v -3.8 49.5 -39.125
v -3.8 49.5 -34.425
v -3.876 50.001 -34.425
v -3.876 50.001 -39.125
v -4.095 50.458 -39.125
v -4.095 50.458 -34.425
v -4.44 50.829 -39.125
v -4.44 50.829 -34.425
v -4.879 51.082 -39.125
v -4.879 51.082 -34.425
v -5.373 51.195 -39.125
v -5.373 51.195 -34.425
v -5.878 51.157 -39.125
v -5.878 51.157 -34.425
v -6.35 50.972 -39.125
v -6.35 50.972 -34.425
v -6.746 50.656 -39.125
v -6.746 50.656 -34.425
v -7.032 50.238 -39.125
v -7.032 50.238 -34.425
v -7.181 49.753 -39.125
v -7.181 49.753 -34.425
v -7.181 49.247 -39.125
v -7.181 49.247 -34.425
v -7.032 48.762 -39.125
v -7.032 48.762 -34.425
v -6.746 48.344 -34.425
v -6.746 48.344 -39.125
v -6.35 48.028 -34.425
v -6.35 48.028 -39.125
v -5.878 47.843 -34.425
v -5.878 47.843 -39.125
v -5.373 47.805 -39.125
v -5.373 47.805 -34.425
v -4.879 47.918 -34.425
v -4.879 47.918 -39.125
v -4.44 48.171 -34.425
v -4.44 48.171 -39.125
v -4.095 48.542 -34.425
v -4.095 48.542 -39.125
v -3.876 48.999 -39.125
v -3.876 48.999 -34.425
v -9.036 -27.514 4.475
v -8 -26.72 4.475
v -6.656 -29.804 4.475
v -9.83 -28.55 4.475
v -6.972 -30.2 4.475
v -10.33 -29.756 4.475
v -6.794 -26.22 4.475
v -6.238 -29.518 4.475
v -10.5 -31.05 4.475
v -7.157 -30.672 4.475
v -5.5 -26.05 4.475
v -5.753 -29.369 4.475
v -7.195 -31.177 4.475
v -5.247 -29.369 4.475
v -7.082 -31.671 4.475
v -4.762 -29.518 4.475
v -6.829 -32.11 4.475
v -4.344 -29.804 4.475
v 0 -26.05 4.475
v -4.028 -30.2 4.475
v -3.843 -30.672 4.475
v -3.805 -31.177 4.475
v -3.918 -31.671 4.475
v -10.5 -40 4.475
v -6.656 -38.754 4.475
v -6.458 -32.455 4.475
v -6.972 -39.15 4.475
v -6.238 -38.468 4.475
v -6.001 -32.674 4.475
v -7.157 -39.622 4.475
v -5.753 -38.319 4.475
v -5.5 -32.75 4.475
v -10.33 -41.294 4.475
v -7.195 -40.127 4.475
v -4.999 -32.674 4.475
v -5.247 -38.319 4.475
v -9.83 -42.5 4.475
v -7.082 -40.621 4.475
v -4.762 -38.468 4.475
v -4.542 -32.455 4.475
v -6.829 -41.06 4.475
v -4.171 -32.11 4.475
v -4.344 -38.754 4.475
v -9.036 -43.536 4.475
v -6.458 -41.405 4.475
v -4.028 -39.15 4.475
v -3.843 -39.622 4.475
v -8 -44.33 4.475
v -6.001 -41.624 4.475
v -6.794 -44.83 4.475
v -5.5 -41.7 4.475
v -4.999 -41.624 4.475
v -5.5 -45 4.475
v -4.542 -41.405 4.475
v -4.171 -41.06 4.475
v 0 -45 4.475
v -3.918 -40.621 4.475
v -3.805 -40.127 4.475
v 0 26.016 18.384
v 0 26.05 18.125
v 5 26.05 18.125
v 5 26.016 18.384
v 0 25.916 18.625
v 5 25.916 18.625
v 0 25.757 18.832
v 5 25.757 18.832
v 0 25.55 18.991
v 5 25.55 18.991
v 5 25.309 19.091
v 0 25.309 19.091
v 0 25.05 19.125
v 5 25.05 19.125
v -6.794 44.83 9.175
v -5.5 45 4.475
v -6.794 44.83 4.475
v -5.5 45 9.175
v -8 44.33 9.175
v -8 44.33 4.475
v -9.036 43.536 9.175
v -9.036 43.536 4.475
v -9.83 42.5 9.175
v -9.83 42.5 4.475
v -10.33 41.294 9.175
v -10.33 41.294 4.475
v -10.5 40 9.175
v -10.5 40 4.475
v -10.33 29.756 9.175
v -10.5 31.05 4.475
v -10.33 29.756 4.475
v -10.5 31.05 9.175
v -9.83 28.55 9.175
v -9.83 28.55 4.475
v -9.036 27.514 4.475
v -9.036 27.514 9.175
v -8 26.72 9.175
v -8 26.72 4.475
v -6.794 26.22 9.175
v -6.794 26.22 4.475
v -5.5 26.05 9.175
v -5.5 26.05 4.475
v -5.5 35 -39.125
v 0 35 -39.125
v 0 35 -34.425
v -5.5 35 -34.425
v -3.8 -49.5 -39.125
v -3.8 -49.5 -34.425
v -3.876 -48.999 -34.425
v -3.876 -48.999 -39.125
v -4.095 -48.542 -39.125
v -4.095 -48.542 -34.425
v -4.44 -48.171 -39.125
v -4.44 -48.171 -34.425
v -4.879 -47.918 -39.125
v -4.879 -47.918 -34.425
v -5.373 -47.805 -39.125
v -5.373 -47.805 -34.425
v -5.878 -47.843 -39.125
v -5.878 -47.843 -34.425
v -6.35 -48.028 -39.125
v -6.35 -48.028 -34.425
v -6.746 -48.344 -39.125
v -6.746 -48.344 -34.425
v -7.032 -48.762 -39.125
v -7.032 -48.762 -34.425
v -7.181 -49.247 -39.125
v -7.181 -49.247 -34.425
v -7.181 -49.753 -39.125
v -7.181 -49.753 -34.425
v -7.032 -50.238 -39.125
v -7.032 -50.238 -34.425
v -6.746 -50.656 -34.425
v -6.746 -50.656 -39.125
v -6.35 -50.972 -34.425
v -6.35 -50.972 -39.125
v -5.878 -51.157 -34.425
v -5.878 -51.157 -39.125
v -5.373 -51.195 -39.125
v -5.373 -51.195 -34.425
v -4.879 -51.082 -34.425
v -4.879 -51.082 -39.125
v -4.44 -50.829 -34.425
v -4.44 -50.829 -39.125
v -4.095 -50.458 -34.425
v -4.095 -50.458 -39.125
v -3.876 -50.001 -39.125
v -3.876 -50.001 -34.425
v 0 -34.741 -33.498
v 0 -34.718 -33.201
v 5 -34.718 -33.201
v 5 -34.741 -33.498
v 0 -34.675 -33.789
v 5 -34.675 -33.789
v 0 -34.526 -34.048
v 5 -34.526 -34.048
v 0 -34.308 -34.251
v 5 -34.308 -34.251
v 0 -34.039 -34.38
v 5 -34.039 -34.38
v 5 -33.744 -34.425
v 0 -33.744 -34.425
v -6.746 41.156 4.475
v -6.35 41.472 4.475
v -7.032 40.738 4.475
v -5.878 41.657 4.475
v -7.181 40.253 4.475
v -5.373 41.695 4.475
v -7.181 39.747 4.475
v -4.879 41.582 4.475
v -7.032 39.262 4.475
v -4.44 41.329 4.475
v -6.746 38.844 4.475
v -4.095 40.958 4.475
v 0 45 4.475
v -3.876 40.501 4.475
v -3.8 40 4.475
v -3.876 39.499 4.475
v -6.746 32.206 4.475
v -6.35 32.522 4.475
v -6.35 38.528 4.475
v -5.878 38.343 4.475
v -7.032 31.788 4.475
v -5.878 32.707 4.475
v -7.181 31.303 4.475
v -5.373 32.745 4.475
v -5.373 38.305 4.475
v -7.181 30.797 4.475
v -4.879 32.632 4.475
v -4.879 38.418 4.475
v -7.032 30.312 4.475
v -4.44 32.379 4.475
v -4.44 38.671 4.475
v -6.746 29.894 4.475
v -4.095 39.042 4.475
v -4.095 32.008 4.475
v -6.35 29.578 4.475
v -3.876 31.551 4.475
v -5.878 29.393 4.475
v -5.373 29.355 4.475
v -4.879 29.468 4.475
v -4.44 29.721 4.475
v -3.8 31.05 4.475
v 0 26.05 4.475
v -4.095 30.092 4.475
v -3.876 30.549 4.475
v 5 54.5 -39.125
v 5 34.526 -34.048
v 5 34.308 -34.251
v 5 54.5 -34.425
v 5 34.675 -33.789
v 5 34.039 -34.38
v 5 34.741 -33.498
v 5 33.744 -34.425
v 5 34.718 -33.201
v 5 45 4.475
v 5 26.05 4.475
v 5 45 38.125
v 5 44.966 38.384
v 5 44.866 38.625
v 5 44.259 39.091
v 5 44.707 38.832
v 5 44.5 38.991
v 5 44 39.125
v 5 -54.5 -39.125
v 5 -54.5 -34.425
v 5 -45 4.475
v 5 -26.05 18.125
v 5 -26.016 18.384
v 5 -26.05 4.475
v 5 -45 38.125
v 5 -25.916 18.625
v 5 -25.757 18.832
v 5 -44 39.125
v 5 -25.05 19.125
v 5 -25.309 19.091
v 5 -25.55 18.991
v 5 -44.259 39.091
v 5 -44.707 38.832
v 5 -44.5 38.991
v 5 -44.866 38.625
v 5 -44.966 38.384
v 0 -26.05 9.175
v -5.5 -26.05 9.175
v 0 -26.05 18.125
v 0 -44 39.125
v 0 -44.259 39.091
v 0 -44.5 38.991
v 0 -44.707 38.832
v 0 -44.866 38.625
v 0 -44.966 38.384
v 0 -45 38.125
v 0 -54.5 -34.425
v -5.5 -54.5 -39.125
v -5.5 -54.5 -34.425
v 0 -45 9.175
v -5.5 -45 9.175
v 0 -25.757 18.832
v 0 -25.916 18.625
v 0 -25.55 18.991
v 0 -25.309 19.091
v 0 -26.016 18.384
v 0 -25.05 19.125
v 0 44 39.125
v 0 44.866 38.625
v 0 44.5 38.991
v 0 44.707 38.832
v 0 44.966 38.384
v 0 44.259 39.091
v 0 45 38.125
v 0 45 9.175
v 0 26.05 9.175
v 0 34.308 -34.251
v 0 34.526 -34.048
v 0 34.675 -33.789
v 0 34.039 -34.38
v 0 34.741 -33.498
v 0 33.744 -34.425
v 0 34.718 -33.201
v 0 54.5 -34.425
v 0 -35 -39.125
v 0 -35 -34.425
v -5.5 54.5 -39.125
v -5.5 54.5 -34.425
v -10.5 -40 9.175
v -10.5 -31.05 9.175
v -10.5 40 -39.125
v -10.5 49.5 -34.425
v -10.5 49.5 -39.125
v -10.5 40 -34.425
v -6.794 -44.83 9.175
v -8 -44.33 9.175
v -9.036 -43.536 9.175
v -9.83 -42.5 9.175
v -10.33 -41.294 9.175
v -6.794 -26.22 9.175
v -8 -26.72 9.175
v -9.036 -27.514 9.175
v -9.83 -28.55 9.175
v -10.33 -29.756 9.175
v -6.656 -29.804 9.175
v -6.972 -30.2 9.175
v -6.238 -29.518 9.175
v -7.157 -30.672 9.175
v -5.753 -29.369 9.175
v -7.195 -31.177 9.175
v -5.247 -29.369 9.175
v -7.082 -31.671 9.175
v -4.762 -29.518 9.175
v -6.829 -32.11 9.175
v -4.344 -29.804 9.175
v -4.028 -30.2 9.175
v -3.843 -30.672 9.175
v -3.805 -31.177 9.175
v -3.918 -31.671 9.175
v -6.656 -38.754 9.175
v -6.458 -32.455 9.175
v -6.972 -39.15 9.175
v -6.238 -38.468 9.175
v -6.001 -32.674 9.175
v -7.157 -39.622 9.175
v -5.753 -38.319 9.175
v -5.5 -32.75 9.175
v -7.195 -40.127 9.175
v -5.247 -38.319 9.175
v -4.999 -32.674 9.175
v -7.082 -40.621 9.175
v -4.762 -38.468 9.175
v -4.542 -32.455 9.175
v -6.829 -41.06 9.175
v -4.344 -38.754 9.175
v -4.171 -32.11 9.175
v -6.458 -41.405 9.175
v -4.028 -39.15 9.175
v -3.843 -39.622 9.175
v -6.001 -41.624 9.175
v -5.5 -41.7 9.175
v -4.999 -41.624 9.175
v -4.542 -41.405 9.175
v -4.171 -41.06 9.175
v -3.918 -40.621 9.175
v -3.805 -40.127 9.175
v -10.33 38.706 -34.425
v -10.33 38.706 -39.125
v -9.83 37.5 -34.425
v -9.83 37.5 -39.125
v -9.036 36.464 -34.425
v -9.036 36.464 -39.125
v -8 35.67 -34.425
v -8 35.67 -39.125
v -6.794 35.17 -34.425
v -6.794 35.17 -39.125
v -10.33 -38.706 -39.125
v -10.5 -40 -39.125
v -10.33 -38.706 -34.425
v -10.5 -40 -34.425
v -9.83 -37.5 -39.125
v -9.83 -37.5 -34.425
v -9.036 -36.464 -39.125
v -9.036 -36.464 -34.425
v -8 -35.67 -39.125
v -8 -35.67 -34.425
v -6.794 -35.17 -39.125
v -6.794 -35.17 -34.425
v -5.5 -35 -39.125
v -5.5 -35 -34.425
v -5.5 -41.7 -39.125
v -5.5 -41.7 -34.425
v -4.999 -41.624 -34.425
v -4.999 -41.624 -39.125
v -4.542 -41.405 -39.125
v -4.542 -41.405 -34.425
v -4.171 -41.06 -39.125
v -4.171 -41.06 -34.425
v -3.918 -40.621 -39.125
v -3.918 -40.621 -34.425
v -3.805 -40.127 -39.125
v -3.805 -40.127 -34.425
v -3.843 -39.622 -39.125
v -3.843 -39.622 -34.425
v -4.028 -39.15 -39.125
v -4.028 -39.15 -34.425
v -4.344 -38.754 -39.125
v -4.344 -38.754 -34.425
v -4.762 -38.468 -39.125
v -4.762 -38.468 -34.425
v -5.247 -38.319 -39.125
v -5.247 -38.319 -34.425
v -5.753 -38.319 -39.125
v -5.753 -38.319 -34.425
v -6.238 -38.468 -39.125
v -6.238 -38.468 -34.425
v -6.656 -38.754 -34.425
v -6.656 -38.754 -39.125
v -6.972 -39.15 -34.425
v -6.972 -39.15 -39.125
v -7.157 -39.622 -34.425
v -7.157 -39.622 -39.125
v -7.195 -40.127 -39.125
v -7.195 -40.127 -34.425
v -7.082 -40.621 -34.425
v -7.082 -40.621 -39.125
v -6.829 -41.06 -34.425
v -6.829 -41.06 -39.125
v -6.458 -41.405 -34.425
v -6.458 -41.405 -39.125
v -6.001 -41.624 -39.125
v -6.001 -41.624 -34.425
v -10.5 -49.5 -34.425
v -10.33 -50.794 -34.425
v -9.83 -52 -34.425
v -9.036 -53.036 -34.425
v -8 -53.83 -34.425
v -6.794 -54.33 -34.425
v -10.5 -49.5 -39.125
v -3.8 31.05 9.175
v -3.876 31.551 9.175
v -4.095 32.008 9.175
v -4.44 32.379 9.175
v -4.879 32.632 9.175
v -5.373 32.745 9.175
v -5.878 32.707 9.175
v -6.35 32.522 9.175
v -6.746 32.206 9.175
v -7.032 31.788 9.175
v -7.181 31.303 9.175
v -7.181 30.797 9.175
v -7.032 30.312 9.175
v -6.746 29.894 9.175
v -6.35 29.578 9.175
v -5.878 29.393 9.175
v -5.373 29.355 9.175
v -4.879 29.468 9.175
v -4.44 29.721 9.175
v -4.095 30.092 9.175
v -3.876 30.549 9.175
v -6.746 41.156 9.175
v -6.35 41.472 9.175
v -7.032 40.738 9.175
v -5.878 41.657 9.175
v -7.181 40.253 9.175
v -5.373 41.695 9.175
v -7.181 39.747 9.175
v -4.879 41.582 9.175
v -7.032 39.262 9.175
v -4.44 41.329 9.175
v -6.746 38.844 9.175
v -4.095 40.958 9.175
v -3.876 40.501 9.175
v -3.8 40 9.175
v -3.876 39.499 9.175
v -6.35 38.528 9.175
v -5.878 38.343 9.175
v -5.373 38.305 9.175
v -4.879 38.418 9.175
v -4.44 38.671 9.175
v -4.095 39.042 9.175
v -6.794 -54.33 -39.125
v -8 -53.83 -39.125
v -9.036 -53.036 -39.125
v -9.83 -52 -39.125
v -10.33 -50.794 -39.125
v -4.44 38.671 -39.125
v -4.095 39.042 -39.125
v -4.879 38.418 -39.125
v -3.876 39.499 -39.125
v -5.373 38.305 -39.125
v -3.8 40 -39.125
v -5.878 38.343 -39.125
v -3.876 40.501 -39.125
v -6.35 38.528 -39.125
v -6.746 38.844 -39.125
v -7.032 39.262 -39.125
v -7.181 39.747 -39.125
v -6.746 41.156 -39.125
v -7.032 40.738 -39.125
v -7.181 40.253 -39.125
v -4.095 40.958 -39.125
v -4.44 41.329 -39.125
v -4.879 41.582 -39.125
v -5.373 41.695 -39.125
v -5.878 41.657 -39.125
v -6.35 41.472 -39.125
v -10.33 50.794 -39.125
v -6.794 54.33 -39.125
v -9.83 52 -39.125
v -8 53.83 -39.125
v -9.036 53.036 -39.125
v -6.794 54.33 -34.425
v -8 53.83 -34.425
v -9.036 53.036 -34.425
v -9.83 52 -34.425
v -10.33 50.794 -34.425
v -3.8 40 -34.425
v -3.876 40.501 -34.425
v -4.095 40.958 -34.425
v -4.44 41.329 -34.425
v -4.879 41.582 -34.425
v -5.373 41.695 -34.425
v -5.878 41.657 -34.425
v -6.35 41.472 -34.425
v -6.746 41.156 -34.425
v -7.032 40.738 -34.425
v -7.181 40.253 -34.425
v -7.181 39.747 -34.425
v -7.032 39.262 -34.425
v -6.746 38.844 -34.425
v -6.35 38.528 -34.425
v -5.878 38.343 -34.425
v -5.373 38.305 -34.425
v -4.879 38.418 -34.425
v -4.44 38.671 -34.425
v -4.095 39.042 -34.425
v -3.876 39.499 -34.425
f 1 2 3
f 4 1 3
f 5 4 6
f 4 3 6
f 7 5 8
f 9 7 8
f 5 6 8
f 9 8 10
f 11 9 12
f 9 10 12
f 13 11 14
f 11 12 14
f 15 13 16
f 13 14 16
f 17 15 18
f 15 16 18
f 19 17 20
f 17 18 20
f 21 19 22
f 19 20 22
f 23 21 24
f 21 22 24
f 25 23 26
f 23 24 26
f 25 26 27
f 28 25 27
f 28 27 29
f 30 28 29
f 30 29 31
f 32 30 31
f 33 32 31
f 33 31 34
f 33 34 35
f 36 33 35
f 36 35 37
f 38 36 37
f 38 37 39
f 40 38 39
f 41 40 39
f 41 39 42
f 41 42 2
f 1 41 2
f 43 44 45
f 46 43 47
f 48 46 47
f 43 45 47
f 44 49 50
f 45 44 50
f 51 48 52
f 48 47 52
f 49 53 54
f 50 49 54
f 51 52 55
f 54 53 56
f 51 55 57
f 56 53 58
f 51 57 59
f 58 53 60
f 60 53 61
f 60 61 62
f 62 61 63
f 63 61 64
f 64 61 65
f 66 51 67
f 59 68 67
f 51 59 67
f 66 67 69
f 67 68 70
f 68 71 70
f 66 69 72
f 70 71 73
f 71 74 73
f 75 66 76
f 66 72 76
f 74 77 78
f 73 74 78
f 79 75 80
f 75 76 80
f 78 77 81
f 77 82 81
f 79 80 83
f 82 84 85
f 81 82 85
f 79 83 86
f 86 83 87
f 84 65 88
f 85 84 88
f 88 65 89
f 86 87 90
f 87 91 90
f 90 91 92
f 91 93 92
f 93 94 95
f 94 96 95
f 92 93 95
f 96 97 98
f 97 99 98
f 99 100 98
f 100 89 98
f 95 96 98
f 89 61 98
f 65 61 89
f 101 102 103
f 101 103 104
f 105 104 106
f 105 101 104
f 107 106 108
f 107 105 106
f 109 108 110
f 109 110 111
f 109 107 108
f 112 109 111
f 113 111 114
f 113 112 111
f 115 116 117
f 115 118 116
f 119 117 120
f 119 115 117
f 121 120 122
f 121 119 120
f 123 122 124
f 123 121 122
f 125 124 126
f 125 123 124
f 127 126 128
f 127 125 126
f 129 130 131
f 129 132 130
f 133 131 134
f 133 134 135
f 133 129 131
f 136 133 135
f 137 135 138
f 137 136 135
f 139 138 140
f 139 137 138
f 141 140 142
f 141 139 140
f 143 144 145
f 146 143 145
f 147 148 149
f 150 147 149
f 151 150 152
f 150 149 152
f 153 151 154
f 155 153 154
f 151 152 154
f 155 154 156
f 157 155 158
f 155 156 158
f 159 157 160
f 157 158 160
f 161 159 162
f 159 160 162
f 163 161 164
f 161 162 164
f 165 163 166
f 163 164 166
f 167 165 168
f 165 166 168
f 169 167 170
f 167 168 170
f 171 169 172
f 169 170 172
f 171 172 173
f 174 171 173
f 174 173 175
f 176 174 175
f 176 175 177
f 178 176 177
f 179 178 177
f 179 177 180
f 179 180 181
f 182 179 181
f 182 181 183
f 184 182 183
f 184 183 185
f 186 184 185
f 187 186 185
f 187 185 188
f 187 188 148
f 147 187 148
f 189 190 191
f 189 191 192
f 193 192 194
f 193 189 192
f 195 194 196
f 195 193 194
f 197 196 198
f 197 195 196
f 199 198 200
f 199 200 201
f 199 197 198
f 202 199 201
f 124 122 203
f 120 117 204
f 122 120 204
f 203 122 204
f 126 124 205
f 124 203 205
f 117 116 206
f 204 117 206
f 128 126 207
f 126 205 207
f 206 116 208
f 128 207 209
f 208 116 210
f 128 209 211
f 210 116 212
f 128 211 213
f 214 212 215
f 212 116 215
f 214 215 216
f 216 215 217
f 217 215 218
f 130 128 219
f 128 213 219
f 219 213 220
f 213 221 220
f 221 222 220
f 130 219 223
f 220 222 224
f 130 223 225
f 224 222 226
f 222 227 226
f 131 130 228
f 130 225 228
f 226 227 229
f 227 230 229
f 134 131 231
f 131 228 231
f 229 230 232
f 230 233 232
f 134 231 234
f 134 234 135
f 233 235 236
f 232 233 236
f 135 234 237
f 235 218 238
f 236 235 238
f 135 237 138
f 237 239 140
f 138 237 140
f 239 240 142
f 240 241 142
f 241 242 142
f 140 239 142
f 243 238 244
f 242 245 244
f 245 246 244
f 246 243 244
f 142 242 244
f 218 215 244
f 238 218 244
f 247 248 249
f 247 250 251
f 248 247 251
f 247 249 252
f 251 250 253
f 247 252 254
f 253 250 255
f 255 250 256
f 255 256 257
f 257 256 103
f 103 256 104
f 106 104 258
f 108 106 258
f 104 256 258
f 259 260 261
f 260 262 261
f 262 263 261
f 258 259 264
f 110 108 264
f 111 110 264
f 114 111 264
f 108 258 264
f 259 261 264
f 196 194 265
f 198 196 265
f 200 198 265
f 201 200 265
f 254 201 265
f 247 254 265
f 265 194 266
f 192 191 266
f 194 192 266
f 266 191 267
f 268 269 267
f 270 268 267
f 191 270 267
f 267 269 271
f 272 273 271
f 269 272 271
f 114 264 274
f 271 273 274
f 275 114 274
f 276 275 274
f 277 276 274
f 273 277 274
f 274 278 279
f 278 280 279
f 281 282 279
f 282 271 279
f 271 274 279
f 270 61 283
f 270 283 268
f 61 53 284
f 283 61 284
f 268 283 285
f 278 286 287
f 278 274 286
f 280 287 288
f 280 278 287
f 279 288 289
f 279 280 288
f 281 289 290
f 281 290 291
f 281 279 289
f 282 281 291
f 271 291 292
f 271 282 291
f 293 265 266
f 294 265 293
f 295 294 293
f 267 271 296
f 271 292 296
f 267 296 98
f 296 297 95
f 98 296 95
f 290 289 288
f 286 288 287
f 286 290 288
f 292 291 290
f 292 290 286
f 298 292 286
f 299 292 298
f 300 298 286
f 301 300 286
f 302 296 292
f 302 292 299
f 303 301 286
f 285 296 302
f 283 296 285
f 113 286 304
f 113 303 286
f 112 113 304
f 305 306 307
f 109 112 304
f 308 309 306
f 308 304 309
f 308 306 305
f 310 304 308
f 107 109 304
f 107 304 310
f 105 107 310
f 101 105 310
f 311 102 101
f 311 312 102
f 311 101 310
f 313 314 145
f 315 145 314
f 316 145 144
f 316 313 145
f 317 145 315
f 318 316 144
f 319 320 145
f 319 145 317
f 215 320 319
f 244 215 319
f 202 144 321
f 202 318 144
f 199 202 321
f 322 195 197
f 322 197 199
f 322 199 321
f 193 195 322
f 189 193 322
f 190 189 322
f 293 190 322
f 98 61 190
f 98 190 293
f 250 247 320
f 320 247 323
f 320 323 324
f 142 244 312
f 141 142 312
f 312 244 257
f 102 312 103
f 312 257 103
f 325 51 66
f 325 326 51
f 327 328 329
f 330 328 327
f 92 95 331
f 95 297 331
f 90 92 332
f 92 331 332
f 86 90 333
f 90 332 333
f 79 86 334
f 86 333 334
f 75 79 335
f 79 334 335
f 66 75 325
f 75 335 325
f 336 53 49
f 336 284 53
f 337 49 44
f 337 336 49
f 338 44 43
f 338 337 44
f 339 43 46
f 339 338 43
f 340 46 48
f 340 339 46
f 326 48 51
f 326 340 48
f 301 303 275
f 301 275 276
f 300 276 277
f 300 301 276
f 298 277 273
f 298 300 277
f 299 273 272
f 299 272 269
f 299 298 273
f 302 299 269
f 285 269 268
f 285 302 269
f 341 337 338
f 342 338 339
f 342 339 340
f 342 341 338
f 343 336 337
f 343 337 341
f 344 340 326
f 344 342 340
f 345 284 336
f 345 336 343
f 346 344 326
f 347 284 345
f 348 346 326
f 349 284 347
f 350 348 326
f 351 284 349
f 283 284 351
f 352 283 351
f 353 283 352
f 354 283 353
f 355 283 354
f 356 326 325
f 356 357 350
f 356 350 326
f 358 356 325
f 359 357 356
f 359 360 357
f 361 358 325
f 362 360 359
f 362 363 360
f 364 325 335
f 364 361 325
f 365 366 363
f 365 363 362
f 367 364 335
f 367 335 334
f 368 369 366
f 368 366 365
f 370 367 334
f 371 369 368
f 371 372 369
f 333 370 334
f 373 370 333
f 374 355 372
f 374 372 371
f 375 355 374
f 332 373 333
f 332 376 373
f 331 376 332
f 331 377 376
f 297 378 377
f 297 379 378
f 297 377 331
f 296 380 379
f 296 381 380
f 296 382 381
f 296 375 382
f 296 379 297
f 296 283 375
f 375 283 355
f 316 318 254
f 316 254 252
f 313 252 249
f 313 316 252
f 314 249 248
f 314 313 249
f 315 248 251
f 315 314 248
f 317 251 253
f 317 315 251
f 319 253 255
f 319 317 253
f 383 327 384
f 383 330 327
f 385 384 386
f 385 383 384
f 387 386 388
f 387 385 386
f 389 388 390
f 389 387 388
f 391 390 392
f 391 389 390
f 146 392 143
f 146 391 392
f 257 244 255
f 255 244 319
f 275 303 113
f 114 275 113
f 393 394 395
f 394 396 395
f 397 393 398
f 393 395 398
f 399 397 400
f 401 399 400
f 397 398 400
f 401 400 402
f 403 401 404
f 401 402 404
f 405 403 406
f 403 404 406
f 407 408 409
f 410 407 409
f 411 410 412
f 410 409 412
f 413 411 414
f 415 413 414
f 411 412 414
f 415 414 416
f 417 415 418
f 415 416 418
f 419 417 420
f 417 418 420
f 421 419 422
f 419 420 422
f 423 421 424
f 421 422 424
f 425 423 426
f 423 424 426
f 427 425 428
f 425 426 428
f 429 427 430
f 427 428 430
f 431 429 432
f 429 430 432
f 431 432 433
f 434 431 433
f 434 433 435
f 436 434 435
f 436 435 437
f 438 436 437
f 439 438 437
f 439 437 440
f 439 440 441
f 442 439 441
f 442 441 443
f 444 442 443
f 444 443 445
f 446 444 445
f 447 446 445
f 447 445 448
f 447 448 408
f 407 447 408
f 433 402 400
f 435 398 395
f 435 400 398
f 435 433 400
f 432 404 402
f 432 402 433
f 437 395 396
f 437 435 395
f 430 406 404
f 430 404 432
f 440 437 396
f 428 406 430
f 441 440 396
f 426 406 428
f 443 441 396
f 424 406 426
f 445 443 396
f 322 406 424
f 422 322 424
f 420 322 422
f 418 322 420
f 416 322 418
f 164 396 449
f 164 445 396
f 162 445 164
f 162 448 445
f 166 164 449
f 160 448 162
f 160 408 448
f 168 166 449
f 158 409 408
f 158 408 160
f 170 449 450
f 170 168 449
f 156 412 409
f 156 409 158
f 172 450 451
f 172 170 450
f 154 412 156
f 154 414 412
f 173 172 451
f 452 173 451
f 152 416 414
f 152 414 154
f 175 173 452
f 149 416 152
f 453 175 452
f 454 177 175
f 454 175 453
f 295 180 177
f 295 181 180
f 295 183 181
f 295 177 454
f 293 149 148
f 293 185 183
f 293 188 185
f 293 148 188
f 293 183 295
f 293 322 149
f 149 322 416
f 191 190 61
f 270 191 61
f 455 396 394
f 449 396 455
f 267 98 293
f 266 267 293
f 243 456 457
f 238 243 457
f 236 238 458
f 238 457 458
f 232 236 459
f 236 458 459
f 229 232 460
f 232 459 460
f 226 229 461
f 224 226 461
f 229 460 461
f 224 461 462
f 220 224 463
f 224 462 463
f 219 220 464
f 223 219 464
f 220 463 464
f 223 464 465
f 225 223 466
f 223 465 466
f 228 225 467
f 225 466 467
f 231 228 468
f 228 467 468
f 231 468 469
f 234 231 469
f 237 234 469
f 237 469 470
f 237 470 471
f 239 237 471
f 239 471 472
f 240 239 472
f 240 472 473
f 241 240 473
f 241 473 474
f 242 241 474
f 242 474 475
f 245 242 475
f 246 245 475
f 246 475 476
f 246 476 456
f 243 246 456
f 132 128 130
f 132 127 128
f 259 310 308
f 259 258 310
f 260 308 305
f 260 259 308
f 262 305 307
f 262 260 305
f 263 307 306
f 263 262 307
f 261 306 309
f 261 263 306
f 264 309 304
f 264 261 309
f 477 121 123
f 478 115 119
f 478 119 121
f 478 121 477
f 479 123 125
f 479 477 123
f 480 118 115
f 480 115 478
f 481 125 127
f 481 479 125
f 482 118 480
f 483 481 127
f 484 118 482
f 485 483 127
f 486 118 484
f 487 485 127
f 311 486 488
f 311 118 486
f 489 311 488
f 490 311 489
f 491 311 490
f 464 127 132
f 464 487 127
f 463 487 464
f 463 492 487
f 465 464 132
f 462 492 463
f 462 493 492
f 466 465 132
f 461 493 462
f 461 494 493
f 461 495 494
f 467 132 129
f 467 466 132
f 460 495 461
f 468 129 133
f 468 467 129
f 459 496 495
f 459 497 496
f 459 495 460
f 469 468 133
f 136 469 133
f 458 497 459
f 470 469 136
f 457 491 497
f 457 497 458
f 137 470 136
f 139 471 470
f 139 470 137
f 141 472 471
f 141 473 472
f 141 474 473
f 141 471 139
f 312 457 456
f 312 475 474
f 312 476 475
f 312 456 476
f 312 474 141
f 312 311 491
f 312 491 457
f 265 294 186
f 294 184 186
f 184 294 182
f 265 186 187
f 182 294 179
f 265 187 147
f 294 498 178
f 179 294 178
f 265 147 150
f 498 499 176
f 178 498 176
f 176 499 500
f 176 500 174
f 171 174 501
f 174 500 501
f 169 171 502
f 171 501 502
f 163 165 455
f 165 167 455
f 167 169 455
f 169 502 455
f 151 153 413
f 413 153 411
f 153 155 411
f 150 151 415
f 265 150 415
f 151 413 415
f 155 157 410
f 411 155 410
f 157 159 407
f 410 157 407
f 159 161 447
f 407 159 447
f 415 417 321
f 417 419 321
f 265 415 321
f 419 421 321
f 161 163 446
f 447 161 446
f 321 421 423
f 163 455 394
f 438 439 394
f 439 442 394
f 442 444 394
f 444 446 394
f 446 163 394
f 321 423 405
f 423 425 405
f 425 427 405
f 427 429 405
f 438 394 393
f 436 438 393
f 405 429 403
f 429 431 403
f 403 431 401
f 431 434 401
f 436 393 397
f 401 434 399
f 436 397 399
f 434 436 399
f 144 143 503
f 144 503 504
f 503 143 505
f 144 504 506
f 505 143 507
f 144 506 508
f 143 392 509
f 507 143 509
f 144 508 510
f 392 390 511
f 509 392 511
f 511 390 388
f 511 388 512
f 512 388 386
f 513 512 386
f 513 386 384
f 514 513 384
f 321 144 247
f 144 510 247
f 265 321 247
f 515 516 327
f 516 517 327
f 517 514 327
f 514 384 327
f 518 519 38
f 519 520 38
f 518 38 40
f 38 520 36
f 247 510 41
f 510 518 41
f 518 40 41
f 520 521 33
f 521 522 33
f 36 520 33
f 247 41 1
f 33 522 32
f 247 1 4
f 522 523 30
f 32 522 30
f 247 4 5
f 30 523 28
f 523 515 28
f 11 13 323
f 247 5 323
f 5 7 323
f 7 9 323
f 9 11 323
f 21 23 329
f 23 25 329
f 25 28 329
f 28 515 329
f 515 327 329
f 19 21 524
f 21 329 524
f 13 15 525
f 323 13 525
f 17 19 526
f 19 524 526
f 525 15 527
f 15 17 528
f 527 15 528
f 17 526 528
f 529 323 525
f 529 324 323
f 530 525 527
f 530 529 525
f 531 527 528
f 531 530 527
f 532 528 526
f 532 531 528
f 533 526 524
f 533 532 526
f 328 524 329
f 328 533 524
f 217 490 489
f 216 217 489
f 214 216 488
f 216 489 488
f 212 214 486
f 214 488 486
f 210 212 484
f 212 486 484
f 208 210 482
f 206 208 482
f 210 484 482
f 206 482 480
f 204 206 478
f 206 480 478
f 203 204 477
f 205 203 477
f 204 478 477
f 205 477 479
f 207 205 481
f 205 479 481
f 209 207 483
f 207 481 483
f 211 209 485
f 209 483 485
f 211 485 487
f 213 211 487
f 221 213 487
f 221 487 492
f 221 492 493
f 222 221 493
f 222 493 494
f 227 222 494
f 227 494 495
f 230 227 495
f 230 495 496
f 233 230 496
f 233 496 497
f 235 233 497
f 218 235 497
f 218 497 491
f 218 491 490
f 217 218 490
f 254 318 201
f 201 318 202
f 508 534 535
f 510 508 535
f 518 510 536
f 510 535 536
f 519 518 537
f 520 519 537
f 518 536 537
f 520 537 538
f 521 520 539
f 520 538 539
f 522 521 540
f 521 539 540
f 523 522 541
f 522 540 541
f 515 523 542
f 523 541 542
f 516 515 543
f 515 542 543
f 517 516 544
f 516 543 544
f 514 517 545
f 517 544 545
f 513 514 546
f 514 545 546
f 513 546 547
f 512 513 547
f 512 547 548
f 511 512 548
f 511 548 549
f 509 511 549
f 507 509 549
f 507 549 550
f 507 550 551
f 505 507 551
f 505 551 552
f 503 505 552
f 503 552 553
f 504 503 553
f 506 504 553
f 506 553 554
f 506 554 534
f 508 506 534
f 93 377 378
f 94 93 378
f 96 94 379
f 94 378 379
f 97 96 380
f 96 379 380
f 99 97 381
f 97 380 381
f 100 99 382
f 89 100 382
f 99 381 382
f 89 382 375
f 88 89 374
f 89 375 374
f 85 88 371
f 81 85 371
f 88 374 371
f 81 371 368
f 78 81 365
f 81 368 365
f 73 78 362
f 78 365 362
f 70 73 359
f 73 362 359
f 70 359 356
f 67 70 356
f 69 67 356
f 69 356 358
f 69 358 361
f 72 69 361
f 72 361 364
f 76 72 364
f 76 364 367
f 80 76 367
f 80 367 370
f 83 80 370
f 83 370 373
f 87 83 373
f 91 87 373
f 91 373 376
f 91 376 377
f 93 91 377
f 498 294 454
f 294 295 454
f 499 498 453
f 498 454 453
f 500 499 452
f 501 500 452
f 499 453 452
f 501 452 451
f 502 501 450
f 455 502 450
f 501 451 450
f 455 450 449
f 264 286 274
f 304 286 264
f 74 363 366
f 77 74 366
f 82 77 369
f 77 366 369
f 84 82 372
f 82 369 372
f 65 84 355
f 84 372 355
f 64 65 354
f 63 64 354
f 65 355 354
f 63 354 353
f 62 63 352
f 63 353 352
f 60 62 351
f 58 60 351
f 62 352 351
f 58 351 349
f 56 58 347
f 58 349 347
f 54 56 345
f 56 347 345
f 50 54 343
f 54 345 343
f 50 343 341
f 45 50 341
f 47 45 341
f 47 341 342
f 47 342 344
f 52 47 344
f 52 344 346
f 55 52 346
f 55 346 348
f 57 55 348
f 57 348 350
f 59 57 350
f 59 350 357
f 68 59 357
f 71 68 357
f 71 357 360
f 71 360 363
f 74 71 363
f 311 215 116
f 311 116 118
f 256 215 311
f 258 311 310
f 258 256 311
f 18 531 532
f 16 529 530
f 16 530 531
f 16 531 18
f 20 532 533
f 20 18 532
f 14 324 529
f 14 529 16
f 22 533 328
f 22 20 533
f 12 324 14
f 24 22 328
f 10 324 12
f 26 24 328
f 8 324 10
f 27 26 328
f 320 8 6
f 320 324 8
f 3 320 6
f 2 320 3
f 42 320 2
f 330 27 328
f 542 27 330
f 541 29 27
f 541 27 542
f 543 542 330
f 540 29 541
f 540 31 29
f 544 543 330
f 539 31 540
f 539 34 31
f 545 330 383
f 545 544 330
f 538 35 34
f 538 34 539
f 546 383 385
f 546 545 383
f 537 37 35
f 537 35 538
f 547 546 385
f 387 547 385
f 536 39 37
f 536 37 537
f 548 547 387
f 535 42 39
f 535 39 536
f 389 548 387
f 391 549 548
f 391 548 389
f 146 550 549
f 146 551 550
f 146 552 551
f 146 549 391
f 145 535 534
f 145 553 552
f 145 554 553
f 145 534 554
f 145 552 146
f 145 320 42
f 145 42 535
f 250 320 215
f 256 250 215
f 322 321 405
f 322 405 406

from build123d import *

# Parameters (mm, degrees)
SKETCH_1_W          = 109
SKETCH_1_H          = 78.25
EXTRUDE_1_DEPTH     = 5
CUT_EXTRUDE_1_DEPTH = 5
SKETCH_3_W          = 18.95
SKETCH_3_H          = 4.7
SKETCH_3_W_2        = 19.5
EXTRUDE_2_DEPTH     = 10.5
SKETCH_4_R          = 1.7
CUT_EXTRUDE_2_DEPTH = 5
SKETCH_5_R          = 1.7
CUT_EXTRUDE_3_DEPTH = 5
FILLET_1_R          = 5
FILLET_2_R          = 1
FILLET_3_R          = 1


with BuildPart() as part:
    # 草圖1 → 填料-伸長1 (new body)
    with BuildSketch(Plane.YZ):
        Rectangle(SKETCH_1_W, SKETCH_1_H)
    extrude(amount=EXTRUDE_1_DEPTH)

    # 草圖2 → 除料-伸長1 (cut)
    with BuildSketch(Plane(origin=(0, 0, 0), x_dir=(0, -1, 0), z_dir=(-1, 0, 0))):
        Polygon((-54.5, 39.125), (-54.5, -34.425), (-45, 4.475), (-45, 39.125), align=None)
        Polygon((45, 39.125), (45, 4.475), (54.5, -34.425), (54.5, 39.125), align=None)
        Polygon((-35, -34.425), (35, -34.425), (26.05, 4.475), (26.05, 19.125), (-26.05, 19.125), (-26.05, 4.475), align=None)
    extrude(amount=-CUT_EXTRUDE_1_DEPTH, mode=Mode.SUBTRACT)

    # 草圖3 → 填料-伸長2 (add)
    with BuildSketch(Plane(origin=(0, 0, 0), x_dir=(0, -1, 0), z_dir=(-1, 0, 0))):
        with Locations((-35.525, 6.825)):
            Rectangle(SKETCH_3_W, SKETCH_3_H)
        with Locations((-44.75, -36.775)):
            Rectangle(SKETCH_3_W_2, SKETCH_3_H)
        with Locations((44.75, -36.775)):
            Rectangle(SKETCH_3_W_2, SKETCH_3_H)
        with Locations((35.525, 6.825)):
            Rectangle(SKETCH_3_W, SKETCH_3_H)
    extrude(amount=EXTRUDE_2_DEPTH)

    # 草圖4 → 除料-伸長2 (cut)
    with BuildSketch(Plane(origin=(0, 0, 9.175), x_dir=(0, -1, 0), z_dir=(0, 0, 1))):
        with Locations(Location((-40, -5.5, 0), (0, 0, 90))):
            Circle(SKETCH_4_R)
        with Locations(Location((-31.05, -5.5, 0), (0, 0, 90))):
            Circle(SKETCH_4_R)
        with Locations((31.05, -5.5)):
            Circle(SKETCH_4_R)
        with Locations((40, -5.5)):
            Circle(SKETCH_4_R)
    extrude(amount=-CUT_EXTRUDE_2_DEPTH, mode=Mode.SUBTRACT)

    # 草圖5 → 除料-伸長3 (cut)
    with BuildSketch(Plane(origin=(0, 0, -34.425), x_dir=(0, -1, 0), z_dir=(0, 0, 1))):
        with Locations(Location((-49.5, -5.5, 0), (0, 0, 90))):
            Circle(SKETCH_5_R)
        with Locations(Location((-40, -5.5, 0), (0, 0, 90))):
            Circle(SKETCH_5_R)
        with Locations((40, -5.5)):
            Circle(SKETCH_5_R)
        with Locations(Location((49.5, -5.5, 0), (0, 0, 90))):
            Circle(SKETCH_5_R)
    extrude(amount=-CUT_EXTRUDE_3_DEPTH, mode=Mode.SUBTRACT)

    # 圓角1
    fillet_1_edges = [part.edges().sort_by_distance(p)[0] for p in [
        (-10.5, -45, 6.825),
        (-10.5, -26.05, 6.825),
        (-10.5, -54.5, -36.775),
        (-10.5, -35, -36.775),
        (-10.5, 54.5, -36.775),
        (-10.5, 35, -36.775),
        (-10.5, 45, 6.825),
        (-10.5, 26.05, 6.825),
    ]]
    fillet(fillet_1_edges, radius=FILLET_1_R)

    # 圓角2
    fillet_2_edges = [part.edges().sort_by_distance(p)[0] for p in [
        (2.5, 45, 39.125),
        (2.5, -45, 39.125),
    ]]
    fillet(fillet_2_edges, radius=FILLET_2_R)

    # 圓角3
    # the kernel refuses this fillet: 1 mm, written as the material it adds along each edge
    with BuildSketch(Plane(origin=(0, 35, -34.425), x_dir=(0, -1, 0), z_dir=(1, 0, 0))) as fillet_3_piece_1:
        with BuildLine():
            CenterArc((FILLET_3_R * 1.25620356602, -FILLET_3_R), FILLET_3_R, 90, 102.956961135)
            Line((FILLET_3_R * 0.281664799684, -FILLET_3_R * 1.22421907349), (0, 0))
            Line((0, 0), (FILLET_3_R * 1.25620356602, 0))
        make_face()
    extrude(amount=5)
    with BuildSketch(Plane(origin=(0, 26.05, 19.125), x_dir=(0, -1, 0), z_dir=(1, 0, 0)), Plane(origin=(0, -26.05, 19.125), x_dir=(0, 0, -1), z_dir=(1, 0, 0))) as fillet_3_piece_2:
        with BuildLine():
            CenterArc((FILLET_3_R, FILLET_3_R), FILLET_3_R, 180, 90)
            Line((0, FILLET_3_R), (0, 0))
            Line((0, 0), (FILLET_3_R, 0))
        make_face()
    extrude(amount=5)
    with BuildSketch(Plane(origin=(0, -35, -34.425), x_dir=(0, 1, 0), z_dir=(1, 0, 0))) as fillet_3_piece_3:
        with BuildLine():
            CenterArc((FILLET_3_R * 1.25620356602, FILLET_3_R), FILLET_3_R, 167.043038865, 102.956961135)
            Line((FILLET_3_R * 0.281664799684, FILLET_3_R * 1.22421907349), (0, 0))
            Line((0, 0), (FILLET_3_R * 1.25620356602, 0))
        make_face()
    extrude(amount=5)


solid = part.part
